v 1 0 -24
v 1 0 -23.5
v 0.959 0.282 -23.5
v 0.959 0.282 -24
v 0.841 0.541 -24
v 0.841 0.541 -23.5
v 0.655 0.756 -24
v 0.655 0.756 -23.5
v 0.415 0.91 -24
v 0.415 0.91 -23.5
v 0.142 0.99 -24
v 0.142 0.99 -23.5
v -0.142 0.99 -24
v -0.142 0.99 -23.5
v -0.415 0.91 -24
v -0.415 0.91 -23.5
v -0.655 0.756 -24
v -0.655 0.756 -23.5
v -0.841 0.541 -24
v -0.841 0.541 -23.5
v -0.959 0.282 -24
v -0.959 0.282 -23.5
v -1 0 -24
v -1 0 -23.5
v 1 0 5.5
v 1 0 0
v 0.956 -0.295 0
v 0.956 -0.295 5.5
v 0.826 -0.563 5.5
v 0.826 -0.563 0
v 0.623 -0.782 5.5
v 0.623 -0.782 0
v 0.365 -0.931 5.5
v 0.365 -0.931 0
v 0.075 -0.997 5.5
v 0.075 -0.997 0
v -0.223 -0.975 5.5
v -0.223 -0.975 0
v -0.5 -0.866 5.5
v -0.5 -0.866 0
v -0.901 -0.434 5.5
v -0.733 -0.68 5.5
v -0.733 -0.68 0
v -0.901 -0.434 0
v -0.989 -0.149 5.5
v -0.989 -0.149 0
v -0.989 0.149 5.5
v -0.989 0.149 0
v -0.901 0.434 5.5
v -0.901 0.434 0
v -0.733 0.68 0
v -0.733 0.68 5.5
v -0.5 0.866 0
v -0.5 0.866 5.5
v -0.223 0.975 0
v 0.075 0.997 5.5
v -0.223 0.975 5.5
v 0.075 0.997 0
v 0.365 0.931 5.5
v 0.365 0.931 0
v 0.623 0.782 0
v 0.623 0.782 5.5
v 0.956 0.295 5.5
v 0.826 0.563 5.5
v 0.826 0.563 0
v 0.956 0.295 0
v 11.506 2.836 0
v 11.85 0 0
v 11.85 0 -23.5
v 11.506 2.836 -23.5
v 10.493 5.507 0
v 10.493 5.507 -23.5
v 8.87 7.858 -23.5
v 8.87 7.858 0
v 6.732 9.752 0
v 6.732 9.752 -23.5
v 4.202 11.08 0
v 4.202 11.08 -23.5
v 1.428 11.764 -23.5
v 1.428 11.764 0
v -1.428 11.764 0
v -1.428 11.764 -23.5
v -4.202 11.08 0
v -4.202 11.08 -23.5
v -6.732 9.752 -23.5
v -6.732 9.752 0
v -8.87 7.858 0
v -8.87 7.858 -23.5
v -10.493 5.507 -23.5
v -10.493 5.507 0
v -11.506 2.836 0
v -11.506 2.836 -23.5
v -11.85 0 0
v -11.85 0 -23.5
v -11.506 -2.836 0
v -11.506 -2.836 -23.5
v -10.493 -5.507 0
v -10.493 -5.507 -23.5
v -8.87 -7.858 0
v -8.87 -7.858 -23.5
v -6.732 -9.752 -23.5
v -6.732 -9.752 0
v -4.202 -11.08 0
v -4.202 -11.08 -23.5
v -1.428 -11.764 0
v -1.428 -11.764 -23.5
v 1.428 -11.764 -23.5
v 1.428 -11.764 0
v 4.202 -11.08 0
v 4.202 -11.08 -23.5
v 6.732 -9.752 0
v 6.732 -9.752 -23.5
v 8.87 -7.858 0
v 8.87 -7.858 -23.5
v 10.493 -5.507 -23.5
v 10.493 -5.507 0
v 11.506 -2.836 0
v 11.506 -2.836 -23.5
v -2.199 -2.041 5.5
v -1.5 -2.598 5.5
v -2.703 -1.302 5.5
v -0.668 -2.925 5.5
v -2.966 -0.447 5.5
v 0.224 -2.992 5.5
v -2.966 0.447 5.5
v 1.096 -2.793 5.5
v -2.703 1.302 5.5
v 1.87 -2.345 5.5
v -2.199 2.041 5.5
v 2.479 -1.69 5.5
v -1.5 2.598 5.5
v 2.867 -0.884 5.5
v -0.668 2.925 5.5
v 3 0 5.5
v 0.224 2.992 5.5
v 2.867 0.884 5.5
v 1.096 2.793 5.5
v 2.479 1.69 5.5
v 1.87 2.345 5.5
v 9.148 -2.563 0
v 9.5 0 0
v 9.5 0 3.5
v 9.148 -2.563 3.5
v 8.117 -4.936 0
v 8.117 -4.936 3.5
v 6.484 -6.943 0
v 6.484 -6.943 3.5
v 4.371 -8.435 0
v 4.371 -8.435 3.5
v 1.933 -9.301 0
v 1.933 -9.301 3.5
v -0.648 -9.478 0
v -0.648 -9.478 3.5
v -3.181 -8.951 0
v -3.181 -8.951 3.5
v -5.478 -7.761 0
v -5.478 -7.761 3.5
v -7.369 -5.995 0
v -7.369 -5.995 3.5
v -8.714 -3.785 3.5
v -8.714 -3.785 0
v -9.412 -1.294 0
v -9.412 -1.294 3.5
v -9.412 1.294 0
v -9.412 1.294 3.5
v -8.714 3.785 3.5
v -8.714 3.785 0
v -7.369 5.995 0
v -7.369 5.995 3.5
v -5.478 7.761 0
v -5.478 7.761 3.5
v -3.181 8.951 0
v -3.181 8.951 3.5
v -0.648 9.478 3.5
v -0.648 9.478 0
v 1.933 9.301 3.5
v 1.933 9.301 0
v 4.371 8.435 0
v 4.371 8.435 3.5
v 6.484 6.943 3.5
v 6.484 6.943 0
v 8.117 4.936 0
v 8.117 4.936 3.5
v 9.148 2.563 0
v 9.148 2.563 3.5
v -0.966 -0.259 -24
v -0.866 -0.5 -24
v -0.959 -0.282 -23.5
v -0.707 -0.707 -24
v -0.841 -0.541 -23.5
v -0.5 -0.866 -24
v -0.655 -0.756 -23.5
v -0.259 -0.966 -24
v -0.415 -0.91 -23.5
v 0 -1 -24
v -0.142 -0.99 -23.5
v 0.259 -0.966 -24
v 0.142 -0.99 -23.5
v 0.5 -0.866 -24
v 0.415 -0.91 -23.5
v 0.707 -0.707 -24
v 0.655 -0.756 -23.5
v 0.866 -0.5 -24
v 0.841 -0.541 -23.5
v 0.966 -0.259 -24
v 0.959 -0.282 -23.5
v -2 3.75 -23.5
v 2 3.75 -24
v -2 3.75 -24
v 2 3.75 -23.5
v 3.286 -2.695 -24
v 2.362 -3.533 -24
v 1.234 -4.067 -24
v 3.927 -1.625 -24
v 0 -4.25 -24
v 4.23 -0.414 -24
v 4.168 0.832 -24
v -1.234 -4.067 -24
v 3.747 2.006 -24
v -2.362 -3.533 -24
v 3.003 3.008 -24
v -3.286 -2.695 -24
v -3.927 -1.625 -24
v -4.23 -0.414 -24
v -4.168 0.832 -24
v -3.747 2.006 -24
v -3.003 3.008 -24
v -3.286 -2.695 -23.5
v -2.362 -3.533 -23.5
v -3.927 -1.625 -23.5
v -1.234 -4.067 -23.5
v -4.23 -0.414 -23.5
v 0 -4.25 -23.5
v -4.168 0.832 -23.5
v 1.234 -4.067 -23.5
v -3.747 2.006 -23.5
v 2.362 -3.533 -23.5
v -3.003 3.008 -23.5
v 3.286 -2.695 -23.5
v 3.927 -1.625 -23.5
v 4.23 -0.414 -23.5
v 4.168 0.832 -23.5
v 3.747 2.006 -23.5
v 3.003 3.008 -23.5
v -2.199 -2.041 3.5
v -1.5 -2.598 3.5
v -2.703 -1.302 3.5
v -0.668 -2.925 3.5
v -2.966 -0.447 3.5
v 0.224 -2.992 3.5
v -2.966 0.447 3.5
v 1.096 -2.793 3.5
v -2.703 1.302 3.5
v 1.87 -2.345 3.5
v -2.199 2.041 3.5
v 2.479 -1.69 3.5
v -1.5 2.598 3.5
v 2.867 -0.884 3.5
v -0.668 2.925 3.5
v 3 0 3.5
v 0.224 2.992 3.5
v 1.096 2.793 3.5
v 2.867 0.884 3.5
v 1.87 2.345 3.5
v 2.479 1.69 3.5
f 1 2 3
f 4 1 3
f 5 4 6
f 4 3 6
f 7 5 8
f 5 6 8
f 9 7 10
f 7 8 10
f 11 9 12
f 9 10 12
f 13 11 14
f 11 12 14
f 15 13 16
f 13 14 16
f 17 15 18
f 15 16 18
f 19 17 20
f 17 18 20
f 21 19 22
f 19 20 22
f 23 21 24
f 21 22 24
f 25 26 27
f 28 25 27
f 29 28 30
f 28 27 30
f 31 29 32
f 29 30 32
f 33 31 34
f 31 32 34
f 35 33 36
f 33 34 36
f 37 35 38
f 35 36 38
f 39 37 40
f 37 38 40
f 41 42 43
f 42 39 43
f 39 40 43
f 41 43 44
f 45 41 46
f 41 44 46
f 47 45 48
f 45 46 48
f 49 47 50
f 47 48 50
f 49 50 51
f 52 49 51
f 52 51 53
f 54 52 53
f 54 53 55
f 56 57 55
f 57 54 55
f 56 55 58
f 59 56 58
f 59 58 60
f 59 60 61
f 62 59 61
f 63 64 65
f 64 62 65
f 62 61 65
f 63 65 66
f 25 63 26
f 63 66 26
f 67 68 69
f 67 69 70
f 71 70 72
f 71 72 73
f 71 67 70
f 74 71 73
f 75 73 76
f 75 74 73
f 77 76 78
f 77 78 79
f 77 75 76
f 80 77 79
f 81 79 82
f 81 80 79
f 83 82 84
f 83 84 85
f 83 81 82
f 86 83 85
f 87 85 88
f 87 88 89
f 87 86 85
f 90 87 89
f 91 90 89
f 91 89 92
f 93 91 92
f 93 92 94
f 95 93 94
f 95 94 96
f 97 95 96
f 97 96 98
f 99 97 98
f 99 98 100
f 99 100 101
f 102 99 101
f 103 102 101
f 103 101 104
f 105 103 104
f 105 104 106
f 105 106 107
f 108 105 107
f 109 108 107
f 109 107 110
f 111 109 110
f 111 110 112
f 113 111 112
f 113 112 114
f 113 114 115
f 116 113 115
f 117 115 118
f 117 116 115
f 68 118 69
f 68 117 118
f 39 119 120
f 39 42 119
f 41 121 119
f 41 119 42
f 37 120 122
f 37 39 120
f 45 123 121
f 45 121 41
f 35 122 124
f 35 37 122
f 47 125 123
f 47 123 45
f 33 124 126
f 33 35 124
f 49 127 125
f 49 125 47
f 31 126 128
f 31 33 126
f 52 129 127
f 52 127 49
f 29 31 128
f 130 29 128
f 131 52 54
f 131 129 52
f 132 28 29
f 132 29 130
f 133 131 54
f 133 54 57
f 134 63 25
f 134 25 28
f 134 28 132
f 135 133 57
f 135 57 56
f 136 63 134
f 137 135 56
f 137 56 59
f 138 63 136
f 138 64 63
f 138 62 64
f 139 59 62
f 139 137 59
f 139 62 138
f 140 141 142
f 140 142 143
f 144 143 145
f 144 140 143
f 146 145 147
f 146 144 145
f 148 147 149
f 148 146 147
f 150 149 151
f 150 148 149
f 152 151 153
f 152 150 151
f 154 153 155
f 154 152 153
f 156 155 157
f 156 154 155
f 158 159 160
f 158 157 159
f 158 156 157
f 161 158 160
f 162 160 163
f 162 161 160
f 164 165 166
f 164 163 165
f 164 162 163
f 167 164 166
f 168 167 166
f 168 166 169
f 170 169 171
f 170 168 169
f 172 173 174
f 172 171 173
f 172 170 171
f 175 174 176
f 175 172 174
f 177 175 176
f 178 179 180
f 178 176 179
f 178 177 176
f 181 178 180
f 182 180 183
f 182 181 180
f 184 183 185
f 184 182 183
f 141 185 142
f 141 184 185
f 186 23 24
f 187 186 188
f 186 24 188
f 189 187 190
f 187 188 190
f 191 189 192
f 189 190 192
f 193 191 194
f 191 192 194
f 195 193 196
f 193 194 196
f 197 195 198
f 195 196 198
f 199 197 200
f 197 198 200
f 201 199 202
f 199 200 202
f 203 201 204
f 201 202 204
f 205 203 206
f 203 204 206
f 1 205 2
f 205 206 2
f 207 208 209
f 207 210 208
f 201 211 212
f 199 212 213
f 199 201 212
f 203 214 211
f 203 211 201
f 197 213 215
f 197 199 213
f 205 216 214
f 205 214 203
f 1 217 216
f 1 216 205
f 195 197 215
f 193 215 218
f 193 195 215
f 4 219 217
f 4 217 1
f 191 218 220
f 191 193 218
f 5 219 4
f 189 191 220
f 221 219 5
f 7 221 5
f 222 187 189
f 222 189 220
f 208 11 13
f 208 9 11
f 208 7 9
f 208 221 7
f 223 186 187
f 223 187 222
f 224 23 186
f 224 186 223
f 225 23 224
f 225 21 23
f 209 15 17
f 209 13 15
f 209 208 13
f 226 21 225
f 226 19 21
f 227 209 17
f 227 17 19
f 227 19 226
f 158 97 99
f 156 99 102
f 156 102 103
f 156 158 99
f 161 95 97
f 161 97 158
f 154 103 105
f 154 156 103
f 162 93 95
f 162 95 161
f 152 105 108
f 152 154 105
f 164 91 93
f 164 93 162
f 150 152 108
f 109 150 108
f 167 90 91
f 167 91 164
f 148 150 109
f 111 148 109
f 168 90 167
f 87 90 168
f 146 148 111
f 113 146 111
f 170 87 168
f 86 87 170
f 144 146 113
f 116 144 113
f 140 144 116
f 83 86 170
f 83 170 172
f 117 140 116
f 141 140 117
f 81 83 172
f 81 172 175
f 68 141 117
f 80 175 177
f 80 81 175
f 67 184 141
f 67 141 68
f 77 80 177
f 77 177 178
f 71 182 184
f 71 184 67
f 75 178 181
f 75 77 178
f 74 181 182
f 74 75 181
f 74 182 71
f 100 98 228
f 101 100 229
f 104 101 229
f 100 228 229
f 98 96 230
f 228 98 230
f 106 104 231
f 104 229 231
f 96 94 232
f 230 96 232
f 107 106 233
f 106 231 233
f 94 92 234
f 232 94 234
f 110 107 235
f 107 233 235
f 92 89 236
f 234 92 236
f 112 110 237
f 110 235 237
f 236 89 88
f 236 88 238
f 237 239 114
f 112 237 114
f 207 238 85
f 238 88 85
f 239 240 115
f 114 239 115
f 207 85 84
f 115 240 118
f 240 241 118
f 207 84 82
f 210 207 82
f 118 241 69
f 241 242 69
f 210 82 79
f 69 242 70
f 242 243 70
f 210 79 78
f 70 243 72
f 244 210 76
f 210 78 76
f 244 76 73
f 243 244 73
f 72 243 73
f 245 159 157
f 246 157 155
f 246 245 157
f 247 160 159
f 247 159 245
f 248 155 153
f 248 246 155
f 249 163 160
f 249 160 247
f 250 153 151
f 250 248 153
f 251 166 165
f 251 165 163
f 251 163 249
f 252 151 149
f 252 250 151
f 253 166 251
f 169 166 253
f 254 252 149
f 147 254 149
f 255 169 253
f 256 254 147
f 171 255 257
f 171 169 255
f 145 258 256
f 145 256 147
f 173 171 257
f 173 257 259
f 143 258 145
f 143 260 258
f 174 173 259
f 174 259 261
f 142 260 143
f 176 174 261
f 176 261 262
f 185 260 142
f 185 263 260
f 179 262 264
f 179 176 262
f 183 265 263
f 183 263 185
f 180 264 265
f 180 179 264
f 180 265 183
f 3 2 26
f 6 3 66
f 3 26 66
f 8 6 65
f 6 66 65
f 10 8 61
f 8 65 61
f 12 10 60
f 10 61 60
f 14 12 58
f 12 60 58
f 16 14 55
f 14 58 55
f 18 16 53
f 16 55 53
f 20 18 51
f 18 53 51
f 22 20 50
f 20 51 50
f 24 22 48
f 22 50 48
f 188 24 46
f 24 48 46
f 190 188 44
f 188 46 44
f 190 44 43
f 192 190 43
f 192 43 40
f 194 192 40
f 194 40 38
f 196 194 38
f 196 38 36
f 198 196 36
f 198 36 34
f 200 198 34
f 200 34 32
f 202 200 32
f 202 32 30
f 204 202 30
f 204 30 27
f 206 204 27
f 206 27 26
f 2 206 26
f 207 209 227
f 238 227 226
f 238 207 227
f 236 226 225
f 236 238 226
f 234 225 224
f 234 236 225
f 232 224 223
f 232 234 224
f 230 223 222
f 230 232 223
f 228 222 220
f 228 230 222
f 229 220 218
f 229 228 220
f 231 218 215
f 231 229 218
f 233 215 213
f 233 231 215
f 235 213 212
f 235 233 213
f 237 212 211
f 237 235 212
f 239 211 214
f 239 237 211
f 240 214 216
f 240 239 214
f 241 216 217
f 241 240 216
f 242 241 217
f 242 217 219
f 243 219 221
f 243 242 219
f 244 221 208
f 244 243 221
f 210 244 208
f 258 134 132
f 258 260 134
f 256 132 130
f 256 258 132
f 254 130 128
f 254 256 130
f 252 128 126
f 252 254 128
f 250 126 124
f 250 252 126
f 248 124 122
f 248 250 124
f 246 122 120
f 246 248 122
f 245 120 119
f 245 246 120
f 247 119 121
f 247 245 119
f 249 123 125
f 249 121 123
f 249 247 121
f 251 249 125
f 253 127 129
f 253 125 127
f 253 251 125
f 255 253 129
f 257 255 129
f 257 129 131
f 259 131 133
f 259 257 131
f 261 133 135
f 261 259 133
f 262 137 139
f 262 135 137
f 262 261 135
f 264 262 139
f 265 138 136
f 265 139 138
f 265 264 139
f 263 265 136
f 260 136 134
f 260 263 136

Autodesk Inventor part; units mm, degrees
ref_plane "YZ Plane" through (0, 0, 0) normal (1, 0, 0) x (0, 1, 0)
ref_plane "XZ Plane" through (0, 0, 0) normal (0, 1, 0) x (-1, 0, 0)
ref_plane "XY Plane" through (0, 0, 0) normal (0, 0, 1) x (1, 0, 0)
sketch "basescetch" plane through (0, 0, 0) normal (0, 0, 1) x (1, 0, 0)
  circle A0 centre (0, 0) radius 11.85
  circle A1 centre (0, 0) radius 9.5
  circle A2 centre (0, 0) radius 3
  circle A3 centre (0, 0) radius 1
  dimension "d0" = 23.7
  dimension "d1" = 19
  dimension "d2" = 6
  dimension "d3" = 2
extrude "押し出し1" add sketch "basescetch" along normal blind 3.5 contours A1
extrude "押し出し2" add sketch "basescetch" along normal blind 5.5 contours A2
extrude "押し出し3" add sketch "basescetch" against normal blind 23.5 contours A0 | A1 | A2 | A3
sketch "スケッチ2" plane through (0, 0, -23.5) normal (0, 0, -1) x (-1, 0, 0)
  circle A0 centre (0, 0) radius 1 projected
  arc A1 (-2, 3.75) -> (2, 3.75) centre (0, 0) ccw
  line L0 (0, -4.25) -> (0, -1)
  line L1 (0, -4.25) -> (8, -4.25) construction
  line L2 (0, 3.75) -> (2, 3.75)
  line L3 (-2, 3.75) -> (0, 3.75)
  dimension "d10" = 8.5
  dimension "d11" = 8
  dimension "d12" = 90
extrude "押し出し4" add sketch "スケッチ2" along normal blind 0.5
extrude "押し出し5" cut sketch "basescetch" against normal through all contours A3
properties part number "motor_for6speedgearbox" material "鉄、可鍛鉄"
